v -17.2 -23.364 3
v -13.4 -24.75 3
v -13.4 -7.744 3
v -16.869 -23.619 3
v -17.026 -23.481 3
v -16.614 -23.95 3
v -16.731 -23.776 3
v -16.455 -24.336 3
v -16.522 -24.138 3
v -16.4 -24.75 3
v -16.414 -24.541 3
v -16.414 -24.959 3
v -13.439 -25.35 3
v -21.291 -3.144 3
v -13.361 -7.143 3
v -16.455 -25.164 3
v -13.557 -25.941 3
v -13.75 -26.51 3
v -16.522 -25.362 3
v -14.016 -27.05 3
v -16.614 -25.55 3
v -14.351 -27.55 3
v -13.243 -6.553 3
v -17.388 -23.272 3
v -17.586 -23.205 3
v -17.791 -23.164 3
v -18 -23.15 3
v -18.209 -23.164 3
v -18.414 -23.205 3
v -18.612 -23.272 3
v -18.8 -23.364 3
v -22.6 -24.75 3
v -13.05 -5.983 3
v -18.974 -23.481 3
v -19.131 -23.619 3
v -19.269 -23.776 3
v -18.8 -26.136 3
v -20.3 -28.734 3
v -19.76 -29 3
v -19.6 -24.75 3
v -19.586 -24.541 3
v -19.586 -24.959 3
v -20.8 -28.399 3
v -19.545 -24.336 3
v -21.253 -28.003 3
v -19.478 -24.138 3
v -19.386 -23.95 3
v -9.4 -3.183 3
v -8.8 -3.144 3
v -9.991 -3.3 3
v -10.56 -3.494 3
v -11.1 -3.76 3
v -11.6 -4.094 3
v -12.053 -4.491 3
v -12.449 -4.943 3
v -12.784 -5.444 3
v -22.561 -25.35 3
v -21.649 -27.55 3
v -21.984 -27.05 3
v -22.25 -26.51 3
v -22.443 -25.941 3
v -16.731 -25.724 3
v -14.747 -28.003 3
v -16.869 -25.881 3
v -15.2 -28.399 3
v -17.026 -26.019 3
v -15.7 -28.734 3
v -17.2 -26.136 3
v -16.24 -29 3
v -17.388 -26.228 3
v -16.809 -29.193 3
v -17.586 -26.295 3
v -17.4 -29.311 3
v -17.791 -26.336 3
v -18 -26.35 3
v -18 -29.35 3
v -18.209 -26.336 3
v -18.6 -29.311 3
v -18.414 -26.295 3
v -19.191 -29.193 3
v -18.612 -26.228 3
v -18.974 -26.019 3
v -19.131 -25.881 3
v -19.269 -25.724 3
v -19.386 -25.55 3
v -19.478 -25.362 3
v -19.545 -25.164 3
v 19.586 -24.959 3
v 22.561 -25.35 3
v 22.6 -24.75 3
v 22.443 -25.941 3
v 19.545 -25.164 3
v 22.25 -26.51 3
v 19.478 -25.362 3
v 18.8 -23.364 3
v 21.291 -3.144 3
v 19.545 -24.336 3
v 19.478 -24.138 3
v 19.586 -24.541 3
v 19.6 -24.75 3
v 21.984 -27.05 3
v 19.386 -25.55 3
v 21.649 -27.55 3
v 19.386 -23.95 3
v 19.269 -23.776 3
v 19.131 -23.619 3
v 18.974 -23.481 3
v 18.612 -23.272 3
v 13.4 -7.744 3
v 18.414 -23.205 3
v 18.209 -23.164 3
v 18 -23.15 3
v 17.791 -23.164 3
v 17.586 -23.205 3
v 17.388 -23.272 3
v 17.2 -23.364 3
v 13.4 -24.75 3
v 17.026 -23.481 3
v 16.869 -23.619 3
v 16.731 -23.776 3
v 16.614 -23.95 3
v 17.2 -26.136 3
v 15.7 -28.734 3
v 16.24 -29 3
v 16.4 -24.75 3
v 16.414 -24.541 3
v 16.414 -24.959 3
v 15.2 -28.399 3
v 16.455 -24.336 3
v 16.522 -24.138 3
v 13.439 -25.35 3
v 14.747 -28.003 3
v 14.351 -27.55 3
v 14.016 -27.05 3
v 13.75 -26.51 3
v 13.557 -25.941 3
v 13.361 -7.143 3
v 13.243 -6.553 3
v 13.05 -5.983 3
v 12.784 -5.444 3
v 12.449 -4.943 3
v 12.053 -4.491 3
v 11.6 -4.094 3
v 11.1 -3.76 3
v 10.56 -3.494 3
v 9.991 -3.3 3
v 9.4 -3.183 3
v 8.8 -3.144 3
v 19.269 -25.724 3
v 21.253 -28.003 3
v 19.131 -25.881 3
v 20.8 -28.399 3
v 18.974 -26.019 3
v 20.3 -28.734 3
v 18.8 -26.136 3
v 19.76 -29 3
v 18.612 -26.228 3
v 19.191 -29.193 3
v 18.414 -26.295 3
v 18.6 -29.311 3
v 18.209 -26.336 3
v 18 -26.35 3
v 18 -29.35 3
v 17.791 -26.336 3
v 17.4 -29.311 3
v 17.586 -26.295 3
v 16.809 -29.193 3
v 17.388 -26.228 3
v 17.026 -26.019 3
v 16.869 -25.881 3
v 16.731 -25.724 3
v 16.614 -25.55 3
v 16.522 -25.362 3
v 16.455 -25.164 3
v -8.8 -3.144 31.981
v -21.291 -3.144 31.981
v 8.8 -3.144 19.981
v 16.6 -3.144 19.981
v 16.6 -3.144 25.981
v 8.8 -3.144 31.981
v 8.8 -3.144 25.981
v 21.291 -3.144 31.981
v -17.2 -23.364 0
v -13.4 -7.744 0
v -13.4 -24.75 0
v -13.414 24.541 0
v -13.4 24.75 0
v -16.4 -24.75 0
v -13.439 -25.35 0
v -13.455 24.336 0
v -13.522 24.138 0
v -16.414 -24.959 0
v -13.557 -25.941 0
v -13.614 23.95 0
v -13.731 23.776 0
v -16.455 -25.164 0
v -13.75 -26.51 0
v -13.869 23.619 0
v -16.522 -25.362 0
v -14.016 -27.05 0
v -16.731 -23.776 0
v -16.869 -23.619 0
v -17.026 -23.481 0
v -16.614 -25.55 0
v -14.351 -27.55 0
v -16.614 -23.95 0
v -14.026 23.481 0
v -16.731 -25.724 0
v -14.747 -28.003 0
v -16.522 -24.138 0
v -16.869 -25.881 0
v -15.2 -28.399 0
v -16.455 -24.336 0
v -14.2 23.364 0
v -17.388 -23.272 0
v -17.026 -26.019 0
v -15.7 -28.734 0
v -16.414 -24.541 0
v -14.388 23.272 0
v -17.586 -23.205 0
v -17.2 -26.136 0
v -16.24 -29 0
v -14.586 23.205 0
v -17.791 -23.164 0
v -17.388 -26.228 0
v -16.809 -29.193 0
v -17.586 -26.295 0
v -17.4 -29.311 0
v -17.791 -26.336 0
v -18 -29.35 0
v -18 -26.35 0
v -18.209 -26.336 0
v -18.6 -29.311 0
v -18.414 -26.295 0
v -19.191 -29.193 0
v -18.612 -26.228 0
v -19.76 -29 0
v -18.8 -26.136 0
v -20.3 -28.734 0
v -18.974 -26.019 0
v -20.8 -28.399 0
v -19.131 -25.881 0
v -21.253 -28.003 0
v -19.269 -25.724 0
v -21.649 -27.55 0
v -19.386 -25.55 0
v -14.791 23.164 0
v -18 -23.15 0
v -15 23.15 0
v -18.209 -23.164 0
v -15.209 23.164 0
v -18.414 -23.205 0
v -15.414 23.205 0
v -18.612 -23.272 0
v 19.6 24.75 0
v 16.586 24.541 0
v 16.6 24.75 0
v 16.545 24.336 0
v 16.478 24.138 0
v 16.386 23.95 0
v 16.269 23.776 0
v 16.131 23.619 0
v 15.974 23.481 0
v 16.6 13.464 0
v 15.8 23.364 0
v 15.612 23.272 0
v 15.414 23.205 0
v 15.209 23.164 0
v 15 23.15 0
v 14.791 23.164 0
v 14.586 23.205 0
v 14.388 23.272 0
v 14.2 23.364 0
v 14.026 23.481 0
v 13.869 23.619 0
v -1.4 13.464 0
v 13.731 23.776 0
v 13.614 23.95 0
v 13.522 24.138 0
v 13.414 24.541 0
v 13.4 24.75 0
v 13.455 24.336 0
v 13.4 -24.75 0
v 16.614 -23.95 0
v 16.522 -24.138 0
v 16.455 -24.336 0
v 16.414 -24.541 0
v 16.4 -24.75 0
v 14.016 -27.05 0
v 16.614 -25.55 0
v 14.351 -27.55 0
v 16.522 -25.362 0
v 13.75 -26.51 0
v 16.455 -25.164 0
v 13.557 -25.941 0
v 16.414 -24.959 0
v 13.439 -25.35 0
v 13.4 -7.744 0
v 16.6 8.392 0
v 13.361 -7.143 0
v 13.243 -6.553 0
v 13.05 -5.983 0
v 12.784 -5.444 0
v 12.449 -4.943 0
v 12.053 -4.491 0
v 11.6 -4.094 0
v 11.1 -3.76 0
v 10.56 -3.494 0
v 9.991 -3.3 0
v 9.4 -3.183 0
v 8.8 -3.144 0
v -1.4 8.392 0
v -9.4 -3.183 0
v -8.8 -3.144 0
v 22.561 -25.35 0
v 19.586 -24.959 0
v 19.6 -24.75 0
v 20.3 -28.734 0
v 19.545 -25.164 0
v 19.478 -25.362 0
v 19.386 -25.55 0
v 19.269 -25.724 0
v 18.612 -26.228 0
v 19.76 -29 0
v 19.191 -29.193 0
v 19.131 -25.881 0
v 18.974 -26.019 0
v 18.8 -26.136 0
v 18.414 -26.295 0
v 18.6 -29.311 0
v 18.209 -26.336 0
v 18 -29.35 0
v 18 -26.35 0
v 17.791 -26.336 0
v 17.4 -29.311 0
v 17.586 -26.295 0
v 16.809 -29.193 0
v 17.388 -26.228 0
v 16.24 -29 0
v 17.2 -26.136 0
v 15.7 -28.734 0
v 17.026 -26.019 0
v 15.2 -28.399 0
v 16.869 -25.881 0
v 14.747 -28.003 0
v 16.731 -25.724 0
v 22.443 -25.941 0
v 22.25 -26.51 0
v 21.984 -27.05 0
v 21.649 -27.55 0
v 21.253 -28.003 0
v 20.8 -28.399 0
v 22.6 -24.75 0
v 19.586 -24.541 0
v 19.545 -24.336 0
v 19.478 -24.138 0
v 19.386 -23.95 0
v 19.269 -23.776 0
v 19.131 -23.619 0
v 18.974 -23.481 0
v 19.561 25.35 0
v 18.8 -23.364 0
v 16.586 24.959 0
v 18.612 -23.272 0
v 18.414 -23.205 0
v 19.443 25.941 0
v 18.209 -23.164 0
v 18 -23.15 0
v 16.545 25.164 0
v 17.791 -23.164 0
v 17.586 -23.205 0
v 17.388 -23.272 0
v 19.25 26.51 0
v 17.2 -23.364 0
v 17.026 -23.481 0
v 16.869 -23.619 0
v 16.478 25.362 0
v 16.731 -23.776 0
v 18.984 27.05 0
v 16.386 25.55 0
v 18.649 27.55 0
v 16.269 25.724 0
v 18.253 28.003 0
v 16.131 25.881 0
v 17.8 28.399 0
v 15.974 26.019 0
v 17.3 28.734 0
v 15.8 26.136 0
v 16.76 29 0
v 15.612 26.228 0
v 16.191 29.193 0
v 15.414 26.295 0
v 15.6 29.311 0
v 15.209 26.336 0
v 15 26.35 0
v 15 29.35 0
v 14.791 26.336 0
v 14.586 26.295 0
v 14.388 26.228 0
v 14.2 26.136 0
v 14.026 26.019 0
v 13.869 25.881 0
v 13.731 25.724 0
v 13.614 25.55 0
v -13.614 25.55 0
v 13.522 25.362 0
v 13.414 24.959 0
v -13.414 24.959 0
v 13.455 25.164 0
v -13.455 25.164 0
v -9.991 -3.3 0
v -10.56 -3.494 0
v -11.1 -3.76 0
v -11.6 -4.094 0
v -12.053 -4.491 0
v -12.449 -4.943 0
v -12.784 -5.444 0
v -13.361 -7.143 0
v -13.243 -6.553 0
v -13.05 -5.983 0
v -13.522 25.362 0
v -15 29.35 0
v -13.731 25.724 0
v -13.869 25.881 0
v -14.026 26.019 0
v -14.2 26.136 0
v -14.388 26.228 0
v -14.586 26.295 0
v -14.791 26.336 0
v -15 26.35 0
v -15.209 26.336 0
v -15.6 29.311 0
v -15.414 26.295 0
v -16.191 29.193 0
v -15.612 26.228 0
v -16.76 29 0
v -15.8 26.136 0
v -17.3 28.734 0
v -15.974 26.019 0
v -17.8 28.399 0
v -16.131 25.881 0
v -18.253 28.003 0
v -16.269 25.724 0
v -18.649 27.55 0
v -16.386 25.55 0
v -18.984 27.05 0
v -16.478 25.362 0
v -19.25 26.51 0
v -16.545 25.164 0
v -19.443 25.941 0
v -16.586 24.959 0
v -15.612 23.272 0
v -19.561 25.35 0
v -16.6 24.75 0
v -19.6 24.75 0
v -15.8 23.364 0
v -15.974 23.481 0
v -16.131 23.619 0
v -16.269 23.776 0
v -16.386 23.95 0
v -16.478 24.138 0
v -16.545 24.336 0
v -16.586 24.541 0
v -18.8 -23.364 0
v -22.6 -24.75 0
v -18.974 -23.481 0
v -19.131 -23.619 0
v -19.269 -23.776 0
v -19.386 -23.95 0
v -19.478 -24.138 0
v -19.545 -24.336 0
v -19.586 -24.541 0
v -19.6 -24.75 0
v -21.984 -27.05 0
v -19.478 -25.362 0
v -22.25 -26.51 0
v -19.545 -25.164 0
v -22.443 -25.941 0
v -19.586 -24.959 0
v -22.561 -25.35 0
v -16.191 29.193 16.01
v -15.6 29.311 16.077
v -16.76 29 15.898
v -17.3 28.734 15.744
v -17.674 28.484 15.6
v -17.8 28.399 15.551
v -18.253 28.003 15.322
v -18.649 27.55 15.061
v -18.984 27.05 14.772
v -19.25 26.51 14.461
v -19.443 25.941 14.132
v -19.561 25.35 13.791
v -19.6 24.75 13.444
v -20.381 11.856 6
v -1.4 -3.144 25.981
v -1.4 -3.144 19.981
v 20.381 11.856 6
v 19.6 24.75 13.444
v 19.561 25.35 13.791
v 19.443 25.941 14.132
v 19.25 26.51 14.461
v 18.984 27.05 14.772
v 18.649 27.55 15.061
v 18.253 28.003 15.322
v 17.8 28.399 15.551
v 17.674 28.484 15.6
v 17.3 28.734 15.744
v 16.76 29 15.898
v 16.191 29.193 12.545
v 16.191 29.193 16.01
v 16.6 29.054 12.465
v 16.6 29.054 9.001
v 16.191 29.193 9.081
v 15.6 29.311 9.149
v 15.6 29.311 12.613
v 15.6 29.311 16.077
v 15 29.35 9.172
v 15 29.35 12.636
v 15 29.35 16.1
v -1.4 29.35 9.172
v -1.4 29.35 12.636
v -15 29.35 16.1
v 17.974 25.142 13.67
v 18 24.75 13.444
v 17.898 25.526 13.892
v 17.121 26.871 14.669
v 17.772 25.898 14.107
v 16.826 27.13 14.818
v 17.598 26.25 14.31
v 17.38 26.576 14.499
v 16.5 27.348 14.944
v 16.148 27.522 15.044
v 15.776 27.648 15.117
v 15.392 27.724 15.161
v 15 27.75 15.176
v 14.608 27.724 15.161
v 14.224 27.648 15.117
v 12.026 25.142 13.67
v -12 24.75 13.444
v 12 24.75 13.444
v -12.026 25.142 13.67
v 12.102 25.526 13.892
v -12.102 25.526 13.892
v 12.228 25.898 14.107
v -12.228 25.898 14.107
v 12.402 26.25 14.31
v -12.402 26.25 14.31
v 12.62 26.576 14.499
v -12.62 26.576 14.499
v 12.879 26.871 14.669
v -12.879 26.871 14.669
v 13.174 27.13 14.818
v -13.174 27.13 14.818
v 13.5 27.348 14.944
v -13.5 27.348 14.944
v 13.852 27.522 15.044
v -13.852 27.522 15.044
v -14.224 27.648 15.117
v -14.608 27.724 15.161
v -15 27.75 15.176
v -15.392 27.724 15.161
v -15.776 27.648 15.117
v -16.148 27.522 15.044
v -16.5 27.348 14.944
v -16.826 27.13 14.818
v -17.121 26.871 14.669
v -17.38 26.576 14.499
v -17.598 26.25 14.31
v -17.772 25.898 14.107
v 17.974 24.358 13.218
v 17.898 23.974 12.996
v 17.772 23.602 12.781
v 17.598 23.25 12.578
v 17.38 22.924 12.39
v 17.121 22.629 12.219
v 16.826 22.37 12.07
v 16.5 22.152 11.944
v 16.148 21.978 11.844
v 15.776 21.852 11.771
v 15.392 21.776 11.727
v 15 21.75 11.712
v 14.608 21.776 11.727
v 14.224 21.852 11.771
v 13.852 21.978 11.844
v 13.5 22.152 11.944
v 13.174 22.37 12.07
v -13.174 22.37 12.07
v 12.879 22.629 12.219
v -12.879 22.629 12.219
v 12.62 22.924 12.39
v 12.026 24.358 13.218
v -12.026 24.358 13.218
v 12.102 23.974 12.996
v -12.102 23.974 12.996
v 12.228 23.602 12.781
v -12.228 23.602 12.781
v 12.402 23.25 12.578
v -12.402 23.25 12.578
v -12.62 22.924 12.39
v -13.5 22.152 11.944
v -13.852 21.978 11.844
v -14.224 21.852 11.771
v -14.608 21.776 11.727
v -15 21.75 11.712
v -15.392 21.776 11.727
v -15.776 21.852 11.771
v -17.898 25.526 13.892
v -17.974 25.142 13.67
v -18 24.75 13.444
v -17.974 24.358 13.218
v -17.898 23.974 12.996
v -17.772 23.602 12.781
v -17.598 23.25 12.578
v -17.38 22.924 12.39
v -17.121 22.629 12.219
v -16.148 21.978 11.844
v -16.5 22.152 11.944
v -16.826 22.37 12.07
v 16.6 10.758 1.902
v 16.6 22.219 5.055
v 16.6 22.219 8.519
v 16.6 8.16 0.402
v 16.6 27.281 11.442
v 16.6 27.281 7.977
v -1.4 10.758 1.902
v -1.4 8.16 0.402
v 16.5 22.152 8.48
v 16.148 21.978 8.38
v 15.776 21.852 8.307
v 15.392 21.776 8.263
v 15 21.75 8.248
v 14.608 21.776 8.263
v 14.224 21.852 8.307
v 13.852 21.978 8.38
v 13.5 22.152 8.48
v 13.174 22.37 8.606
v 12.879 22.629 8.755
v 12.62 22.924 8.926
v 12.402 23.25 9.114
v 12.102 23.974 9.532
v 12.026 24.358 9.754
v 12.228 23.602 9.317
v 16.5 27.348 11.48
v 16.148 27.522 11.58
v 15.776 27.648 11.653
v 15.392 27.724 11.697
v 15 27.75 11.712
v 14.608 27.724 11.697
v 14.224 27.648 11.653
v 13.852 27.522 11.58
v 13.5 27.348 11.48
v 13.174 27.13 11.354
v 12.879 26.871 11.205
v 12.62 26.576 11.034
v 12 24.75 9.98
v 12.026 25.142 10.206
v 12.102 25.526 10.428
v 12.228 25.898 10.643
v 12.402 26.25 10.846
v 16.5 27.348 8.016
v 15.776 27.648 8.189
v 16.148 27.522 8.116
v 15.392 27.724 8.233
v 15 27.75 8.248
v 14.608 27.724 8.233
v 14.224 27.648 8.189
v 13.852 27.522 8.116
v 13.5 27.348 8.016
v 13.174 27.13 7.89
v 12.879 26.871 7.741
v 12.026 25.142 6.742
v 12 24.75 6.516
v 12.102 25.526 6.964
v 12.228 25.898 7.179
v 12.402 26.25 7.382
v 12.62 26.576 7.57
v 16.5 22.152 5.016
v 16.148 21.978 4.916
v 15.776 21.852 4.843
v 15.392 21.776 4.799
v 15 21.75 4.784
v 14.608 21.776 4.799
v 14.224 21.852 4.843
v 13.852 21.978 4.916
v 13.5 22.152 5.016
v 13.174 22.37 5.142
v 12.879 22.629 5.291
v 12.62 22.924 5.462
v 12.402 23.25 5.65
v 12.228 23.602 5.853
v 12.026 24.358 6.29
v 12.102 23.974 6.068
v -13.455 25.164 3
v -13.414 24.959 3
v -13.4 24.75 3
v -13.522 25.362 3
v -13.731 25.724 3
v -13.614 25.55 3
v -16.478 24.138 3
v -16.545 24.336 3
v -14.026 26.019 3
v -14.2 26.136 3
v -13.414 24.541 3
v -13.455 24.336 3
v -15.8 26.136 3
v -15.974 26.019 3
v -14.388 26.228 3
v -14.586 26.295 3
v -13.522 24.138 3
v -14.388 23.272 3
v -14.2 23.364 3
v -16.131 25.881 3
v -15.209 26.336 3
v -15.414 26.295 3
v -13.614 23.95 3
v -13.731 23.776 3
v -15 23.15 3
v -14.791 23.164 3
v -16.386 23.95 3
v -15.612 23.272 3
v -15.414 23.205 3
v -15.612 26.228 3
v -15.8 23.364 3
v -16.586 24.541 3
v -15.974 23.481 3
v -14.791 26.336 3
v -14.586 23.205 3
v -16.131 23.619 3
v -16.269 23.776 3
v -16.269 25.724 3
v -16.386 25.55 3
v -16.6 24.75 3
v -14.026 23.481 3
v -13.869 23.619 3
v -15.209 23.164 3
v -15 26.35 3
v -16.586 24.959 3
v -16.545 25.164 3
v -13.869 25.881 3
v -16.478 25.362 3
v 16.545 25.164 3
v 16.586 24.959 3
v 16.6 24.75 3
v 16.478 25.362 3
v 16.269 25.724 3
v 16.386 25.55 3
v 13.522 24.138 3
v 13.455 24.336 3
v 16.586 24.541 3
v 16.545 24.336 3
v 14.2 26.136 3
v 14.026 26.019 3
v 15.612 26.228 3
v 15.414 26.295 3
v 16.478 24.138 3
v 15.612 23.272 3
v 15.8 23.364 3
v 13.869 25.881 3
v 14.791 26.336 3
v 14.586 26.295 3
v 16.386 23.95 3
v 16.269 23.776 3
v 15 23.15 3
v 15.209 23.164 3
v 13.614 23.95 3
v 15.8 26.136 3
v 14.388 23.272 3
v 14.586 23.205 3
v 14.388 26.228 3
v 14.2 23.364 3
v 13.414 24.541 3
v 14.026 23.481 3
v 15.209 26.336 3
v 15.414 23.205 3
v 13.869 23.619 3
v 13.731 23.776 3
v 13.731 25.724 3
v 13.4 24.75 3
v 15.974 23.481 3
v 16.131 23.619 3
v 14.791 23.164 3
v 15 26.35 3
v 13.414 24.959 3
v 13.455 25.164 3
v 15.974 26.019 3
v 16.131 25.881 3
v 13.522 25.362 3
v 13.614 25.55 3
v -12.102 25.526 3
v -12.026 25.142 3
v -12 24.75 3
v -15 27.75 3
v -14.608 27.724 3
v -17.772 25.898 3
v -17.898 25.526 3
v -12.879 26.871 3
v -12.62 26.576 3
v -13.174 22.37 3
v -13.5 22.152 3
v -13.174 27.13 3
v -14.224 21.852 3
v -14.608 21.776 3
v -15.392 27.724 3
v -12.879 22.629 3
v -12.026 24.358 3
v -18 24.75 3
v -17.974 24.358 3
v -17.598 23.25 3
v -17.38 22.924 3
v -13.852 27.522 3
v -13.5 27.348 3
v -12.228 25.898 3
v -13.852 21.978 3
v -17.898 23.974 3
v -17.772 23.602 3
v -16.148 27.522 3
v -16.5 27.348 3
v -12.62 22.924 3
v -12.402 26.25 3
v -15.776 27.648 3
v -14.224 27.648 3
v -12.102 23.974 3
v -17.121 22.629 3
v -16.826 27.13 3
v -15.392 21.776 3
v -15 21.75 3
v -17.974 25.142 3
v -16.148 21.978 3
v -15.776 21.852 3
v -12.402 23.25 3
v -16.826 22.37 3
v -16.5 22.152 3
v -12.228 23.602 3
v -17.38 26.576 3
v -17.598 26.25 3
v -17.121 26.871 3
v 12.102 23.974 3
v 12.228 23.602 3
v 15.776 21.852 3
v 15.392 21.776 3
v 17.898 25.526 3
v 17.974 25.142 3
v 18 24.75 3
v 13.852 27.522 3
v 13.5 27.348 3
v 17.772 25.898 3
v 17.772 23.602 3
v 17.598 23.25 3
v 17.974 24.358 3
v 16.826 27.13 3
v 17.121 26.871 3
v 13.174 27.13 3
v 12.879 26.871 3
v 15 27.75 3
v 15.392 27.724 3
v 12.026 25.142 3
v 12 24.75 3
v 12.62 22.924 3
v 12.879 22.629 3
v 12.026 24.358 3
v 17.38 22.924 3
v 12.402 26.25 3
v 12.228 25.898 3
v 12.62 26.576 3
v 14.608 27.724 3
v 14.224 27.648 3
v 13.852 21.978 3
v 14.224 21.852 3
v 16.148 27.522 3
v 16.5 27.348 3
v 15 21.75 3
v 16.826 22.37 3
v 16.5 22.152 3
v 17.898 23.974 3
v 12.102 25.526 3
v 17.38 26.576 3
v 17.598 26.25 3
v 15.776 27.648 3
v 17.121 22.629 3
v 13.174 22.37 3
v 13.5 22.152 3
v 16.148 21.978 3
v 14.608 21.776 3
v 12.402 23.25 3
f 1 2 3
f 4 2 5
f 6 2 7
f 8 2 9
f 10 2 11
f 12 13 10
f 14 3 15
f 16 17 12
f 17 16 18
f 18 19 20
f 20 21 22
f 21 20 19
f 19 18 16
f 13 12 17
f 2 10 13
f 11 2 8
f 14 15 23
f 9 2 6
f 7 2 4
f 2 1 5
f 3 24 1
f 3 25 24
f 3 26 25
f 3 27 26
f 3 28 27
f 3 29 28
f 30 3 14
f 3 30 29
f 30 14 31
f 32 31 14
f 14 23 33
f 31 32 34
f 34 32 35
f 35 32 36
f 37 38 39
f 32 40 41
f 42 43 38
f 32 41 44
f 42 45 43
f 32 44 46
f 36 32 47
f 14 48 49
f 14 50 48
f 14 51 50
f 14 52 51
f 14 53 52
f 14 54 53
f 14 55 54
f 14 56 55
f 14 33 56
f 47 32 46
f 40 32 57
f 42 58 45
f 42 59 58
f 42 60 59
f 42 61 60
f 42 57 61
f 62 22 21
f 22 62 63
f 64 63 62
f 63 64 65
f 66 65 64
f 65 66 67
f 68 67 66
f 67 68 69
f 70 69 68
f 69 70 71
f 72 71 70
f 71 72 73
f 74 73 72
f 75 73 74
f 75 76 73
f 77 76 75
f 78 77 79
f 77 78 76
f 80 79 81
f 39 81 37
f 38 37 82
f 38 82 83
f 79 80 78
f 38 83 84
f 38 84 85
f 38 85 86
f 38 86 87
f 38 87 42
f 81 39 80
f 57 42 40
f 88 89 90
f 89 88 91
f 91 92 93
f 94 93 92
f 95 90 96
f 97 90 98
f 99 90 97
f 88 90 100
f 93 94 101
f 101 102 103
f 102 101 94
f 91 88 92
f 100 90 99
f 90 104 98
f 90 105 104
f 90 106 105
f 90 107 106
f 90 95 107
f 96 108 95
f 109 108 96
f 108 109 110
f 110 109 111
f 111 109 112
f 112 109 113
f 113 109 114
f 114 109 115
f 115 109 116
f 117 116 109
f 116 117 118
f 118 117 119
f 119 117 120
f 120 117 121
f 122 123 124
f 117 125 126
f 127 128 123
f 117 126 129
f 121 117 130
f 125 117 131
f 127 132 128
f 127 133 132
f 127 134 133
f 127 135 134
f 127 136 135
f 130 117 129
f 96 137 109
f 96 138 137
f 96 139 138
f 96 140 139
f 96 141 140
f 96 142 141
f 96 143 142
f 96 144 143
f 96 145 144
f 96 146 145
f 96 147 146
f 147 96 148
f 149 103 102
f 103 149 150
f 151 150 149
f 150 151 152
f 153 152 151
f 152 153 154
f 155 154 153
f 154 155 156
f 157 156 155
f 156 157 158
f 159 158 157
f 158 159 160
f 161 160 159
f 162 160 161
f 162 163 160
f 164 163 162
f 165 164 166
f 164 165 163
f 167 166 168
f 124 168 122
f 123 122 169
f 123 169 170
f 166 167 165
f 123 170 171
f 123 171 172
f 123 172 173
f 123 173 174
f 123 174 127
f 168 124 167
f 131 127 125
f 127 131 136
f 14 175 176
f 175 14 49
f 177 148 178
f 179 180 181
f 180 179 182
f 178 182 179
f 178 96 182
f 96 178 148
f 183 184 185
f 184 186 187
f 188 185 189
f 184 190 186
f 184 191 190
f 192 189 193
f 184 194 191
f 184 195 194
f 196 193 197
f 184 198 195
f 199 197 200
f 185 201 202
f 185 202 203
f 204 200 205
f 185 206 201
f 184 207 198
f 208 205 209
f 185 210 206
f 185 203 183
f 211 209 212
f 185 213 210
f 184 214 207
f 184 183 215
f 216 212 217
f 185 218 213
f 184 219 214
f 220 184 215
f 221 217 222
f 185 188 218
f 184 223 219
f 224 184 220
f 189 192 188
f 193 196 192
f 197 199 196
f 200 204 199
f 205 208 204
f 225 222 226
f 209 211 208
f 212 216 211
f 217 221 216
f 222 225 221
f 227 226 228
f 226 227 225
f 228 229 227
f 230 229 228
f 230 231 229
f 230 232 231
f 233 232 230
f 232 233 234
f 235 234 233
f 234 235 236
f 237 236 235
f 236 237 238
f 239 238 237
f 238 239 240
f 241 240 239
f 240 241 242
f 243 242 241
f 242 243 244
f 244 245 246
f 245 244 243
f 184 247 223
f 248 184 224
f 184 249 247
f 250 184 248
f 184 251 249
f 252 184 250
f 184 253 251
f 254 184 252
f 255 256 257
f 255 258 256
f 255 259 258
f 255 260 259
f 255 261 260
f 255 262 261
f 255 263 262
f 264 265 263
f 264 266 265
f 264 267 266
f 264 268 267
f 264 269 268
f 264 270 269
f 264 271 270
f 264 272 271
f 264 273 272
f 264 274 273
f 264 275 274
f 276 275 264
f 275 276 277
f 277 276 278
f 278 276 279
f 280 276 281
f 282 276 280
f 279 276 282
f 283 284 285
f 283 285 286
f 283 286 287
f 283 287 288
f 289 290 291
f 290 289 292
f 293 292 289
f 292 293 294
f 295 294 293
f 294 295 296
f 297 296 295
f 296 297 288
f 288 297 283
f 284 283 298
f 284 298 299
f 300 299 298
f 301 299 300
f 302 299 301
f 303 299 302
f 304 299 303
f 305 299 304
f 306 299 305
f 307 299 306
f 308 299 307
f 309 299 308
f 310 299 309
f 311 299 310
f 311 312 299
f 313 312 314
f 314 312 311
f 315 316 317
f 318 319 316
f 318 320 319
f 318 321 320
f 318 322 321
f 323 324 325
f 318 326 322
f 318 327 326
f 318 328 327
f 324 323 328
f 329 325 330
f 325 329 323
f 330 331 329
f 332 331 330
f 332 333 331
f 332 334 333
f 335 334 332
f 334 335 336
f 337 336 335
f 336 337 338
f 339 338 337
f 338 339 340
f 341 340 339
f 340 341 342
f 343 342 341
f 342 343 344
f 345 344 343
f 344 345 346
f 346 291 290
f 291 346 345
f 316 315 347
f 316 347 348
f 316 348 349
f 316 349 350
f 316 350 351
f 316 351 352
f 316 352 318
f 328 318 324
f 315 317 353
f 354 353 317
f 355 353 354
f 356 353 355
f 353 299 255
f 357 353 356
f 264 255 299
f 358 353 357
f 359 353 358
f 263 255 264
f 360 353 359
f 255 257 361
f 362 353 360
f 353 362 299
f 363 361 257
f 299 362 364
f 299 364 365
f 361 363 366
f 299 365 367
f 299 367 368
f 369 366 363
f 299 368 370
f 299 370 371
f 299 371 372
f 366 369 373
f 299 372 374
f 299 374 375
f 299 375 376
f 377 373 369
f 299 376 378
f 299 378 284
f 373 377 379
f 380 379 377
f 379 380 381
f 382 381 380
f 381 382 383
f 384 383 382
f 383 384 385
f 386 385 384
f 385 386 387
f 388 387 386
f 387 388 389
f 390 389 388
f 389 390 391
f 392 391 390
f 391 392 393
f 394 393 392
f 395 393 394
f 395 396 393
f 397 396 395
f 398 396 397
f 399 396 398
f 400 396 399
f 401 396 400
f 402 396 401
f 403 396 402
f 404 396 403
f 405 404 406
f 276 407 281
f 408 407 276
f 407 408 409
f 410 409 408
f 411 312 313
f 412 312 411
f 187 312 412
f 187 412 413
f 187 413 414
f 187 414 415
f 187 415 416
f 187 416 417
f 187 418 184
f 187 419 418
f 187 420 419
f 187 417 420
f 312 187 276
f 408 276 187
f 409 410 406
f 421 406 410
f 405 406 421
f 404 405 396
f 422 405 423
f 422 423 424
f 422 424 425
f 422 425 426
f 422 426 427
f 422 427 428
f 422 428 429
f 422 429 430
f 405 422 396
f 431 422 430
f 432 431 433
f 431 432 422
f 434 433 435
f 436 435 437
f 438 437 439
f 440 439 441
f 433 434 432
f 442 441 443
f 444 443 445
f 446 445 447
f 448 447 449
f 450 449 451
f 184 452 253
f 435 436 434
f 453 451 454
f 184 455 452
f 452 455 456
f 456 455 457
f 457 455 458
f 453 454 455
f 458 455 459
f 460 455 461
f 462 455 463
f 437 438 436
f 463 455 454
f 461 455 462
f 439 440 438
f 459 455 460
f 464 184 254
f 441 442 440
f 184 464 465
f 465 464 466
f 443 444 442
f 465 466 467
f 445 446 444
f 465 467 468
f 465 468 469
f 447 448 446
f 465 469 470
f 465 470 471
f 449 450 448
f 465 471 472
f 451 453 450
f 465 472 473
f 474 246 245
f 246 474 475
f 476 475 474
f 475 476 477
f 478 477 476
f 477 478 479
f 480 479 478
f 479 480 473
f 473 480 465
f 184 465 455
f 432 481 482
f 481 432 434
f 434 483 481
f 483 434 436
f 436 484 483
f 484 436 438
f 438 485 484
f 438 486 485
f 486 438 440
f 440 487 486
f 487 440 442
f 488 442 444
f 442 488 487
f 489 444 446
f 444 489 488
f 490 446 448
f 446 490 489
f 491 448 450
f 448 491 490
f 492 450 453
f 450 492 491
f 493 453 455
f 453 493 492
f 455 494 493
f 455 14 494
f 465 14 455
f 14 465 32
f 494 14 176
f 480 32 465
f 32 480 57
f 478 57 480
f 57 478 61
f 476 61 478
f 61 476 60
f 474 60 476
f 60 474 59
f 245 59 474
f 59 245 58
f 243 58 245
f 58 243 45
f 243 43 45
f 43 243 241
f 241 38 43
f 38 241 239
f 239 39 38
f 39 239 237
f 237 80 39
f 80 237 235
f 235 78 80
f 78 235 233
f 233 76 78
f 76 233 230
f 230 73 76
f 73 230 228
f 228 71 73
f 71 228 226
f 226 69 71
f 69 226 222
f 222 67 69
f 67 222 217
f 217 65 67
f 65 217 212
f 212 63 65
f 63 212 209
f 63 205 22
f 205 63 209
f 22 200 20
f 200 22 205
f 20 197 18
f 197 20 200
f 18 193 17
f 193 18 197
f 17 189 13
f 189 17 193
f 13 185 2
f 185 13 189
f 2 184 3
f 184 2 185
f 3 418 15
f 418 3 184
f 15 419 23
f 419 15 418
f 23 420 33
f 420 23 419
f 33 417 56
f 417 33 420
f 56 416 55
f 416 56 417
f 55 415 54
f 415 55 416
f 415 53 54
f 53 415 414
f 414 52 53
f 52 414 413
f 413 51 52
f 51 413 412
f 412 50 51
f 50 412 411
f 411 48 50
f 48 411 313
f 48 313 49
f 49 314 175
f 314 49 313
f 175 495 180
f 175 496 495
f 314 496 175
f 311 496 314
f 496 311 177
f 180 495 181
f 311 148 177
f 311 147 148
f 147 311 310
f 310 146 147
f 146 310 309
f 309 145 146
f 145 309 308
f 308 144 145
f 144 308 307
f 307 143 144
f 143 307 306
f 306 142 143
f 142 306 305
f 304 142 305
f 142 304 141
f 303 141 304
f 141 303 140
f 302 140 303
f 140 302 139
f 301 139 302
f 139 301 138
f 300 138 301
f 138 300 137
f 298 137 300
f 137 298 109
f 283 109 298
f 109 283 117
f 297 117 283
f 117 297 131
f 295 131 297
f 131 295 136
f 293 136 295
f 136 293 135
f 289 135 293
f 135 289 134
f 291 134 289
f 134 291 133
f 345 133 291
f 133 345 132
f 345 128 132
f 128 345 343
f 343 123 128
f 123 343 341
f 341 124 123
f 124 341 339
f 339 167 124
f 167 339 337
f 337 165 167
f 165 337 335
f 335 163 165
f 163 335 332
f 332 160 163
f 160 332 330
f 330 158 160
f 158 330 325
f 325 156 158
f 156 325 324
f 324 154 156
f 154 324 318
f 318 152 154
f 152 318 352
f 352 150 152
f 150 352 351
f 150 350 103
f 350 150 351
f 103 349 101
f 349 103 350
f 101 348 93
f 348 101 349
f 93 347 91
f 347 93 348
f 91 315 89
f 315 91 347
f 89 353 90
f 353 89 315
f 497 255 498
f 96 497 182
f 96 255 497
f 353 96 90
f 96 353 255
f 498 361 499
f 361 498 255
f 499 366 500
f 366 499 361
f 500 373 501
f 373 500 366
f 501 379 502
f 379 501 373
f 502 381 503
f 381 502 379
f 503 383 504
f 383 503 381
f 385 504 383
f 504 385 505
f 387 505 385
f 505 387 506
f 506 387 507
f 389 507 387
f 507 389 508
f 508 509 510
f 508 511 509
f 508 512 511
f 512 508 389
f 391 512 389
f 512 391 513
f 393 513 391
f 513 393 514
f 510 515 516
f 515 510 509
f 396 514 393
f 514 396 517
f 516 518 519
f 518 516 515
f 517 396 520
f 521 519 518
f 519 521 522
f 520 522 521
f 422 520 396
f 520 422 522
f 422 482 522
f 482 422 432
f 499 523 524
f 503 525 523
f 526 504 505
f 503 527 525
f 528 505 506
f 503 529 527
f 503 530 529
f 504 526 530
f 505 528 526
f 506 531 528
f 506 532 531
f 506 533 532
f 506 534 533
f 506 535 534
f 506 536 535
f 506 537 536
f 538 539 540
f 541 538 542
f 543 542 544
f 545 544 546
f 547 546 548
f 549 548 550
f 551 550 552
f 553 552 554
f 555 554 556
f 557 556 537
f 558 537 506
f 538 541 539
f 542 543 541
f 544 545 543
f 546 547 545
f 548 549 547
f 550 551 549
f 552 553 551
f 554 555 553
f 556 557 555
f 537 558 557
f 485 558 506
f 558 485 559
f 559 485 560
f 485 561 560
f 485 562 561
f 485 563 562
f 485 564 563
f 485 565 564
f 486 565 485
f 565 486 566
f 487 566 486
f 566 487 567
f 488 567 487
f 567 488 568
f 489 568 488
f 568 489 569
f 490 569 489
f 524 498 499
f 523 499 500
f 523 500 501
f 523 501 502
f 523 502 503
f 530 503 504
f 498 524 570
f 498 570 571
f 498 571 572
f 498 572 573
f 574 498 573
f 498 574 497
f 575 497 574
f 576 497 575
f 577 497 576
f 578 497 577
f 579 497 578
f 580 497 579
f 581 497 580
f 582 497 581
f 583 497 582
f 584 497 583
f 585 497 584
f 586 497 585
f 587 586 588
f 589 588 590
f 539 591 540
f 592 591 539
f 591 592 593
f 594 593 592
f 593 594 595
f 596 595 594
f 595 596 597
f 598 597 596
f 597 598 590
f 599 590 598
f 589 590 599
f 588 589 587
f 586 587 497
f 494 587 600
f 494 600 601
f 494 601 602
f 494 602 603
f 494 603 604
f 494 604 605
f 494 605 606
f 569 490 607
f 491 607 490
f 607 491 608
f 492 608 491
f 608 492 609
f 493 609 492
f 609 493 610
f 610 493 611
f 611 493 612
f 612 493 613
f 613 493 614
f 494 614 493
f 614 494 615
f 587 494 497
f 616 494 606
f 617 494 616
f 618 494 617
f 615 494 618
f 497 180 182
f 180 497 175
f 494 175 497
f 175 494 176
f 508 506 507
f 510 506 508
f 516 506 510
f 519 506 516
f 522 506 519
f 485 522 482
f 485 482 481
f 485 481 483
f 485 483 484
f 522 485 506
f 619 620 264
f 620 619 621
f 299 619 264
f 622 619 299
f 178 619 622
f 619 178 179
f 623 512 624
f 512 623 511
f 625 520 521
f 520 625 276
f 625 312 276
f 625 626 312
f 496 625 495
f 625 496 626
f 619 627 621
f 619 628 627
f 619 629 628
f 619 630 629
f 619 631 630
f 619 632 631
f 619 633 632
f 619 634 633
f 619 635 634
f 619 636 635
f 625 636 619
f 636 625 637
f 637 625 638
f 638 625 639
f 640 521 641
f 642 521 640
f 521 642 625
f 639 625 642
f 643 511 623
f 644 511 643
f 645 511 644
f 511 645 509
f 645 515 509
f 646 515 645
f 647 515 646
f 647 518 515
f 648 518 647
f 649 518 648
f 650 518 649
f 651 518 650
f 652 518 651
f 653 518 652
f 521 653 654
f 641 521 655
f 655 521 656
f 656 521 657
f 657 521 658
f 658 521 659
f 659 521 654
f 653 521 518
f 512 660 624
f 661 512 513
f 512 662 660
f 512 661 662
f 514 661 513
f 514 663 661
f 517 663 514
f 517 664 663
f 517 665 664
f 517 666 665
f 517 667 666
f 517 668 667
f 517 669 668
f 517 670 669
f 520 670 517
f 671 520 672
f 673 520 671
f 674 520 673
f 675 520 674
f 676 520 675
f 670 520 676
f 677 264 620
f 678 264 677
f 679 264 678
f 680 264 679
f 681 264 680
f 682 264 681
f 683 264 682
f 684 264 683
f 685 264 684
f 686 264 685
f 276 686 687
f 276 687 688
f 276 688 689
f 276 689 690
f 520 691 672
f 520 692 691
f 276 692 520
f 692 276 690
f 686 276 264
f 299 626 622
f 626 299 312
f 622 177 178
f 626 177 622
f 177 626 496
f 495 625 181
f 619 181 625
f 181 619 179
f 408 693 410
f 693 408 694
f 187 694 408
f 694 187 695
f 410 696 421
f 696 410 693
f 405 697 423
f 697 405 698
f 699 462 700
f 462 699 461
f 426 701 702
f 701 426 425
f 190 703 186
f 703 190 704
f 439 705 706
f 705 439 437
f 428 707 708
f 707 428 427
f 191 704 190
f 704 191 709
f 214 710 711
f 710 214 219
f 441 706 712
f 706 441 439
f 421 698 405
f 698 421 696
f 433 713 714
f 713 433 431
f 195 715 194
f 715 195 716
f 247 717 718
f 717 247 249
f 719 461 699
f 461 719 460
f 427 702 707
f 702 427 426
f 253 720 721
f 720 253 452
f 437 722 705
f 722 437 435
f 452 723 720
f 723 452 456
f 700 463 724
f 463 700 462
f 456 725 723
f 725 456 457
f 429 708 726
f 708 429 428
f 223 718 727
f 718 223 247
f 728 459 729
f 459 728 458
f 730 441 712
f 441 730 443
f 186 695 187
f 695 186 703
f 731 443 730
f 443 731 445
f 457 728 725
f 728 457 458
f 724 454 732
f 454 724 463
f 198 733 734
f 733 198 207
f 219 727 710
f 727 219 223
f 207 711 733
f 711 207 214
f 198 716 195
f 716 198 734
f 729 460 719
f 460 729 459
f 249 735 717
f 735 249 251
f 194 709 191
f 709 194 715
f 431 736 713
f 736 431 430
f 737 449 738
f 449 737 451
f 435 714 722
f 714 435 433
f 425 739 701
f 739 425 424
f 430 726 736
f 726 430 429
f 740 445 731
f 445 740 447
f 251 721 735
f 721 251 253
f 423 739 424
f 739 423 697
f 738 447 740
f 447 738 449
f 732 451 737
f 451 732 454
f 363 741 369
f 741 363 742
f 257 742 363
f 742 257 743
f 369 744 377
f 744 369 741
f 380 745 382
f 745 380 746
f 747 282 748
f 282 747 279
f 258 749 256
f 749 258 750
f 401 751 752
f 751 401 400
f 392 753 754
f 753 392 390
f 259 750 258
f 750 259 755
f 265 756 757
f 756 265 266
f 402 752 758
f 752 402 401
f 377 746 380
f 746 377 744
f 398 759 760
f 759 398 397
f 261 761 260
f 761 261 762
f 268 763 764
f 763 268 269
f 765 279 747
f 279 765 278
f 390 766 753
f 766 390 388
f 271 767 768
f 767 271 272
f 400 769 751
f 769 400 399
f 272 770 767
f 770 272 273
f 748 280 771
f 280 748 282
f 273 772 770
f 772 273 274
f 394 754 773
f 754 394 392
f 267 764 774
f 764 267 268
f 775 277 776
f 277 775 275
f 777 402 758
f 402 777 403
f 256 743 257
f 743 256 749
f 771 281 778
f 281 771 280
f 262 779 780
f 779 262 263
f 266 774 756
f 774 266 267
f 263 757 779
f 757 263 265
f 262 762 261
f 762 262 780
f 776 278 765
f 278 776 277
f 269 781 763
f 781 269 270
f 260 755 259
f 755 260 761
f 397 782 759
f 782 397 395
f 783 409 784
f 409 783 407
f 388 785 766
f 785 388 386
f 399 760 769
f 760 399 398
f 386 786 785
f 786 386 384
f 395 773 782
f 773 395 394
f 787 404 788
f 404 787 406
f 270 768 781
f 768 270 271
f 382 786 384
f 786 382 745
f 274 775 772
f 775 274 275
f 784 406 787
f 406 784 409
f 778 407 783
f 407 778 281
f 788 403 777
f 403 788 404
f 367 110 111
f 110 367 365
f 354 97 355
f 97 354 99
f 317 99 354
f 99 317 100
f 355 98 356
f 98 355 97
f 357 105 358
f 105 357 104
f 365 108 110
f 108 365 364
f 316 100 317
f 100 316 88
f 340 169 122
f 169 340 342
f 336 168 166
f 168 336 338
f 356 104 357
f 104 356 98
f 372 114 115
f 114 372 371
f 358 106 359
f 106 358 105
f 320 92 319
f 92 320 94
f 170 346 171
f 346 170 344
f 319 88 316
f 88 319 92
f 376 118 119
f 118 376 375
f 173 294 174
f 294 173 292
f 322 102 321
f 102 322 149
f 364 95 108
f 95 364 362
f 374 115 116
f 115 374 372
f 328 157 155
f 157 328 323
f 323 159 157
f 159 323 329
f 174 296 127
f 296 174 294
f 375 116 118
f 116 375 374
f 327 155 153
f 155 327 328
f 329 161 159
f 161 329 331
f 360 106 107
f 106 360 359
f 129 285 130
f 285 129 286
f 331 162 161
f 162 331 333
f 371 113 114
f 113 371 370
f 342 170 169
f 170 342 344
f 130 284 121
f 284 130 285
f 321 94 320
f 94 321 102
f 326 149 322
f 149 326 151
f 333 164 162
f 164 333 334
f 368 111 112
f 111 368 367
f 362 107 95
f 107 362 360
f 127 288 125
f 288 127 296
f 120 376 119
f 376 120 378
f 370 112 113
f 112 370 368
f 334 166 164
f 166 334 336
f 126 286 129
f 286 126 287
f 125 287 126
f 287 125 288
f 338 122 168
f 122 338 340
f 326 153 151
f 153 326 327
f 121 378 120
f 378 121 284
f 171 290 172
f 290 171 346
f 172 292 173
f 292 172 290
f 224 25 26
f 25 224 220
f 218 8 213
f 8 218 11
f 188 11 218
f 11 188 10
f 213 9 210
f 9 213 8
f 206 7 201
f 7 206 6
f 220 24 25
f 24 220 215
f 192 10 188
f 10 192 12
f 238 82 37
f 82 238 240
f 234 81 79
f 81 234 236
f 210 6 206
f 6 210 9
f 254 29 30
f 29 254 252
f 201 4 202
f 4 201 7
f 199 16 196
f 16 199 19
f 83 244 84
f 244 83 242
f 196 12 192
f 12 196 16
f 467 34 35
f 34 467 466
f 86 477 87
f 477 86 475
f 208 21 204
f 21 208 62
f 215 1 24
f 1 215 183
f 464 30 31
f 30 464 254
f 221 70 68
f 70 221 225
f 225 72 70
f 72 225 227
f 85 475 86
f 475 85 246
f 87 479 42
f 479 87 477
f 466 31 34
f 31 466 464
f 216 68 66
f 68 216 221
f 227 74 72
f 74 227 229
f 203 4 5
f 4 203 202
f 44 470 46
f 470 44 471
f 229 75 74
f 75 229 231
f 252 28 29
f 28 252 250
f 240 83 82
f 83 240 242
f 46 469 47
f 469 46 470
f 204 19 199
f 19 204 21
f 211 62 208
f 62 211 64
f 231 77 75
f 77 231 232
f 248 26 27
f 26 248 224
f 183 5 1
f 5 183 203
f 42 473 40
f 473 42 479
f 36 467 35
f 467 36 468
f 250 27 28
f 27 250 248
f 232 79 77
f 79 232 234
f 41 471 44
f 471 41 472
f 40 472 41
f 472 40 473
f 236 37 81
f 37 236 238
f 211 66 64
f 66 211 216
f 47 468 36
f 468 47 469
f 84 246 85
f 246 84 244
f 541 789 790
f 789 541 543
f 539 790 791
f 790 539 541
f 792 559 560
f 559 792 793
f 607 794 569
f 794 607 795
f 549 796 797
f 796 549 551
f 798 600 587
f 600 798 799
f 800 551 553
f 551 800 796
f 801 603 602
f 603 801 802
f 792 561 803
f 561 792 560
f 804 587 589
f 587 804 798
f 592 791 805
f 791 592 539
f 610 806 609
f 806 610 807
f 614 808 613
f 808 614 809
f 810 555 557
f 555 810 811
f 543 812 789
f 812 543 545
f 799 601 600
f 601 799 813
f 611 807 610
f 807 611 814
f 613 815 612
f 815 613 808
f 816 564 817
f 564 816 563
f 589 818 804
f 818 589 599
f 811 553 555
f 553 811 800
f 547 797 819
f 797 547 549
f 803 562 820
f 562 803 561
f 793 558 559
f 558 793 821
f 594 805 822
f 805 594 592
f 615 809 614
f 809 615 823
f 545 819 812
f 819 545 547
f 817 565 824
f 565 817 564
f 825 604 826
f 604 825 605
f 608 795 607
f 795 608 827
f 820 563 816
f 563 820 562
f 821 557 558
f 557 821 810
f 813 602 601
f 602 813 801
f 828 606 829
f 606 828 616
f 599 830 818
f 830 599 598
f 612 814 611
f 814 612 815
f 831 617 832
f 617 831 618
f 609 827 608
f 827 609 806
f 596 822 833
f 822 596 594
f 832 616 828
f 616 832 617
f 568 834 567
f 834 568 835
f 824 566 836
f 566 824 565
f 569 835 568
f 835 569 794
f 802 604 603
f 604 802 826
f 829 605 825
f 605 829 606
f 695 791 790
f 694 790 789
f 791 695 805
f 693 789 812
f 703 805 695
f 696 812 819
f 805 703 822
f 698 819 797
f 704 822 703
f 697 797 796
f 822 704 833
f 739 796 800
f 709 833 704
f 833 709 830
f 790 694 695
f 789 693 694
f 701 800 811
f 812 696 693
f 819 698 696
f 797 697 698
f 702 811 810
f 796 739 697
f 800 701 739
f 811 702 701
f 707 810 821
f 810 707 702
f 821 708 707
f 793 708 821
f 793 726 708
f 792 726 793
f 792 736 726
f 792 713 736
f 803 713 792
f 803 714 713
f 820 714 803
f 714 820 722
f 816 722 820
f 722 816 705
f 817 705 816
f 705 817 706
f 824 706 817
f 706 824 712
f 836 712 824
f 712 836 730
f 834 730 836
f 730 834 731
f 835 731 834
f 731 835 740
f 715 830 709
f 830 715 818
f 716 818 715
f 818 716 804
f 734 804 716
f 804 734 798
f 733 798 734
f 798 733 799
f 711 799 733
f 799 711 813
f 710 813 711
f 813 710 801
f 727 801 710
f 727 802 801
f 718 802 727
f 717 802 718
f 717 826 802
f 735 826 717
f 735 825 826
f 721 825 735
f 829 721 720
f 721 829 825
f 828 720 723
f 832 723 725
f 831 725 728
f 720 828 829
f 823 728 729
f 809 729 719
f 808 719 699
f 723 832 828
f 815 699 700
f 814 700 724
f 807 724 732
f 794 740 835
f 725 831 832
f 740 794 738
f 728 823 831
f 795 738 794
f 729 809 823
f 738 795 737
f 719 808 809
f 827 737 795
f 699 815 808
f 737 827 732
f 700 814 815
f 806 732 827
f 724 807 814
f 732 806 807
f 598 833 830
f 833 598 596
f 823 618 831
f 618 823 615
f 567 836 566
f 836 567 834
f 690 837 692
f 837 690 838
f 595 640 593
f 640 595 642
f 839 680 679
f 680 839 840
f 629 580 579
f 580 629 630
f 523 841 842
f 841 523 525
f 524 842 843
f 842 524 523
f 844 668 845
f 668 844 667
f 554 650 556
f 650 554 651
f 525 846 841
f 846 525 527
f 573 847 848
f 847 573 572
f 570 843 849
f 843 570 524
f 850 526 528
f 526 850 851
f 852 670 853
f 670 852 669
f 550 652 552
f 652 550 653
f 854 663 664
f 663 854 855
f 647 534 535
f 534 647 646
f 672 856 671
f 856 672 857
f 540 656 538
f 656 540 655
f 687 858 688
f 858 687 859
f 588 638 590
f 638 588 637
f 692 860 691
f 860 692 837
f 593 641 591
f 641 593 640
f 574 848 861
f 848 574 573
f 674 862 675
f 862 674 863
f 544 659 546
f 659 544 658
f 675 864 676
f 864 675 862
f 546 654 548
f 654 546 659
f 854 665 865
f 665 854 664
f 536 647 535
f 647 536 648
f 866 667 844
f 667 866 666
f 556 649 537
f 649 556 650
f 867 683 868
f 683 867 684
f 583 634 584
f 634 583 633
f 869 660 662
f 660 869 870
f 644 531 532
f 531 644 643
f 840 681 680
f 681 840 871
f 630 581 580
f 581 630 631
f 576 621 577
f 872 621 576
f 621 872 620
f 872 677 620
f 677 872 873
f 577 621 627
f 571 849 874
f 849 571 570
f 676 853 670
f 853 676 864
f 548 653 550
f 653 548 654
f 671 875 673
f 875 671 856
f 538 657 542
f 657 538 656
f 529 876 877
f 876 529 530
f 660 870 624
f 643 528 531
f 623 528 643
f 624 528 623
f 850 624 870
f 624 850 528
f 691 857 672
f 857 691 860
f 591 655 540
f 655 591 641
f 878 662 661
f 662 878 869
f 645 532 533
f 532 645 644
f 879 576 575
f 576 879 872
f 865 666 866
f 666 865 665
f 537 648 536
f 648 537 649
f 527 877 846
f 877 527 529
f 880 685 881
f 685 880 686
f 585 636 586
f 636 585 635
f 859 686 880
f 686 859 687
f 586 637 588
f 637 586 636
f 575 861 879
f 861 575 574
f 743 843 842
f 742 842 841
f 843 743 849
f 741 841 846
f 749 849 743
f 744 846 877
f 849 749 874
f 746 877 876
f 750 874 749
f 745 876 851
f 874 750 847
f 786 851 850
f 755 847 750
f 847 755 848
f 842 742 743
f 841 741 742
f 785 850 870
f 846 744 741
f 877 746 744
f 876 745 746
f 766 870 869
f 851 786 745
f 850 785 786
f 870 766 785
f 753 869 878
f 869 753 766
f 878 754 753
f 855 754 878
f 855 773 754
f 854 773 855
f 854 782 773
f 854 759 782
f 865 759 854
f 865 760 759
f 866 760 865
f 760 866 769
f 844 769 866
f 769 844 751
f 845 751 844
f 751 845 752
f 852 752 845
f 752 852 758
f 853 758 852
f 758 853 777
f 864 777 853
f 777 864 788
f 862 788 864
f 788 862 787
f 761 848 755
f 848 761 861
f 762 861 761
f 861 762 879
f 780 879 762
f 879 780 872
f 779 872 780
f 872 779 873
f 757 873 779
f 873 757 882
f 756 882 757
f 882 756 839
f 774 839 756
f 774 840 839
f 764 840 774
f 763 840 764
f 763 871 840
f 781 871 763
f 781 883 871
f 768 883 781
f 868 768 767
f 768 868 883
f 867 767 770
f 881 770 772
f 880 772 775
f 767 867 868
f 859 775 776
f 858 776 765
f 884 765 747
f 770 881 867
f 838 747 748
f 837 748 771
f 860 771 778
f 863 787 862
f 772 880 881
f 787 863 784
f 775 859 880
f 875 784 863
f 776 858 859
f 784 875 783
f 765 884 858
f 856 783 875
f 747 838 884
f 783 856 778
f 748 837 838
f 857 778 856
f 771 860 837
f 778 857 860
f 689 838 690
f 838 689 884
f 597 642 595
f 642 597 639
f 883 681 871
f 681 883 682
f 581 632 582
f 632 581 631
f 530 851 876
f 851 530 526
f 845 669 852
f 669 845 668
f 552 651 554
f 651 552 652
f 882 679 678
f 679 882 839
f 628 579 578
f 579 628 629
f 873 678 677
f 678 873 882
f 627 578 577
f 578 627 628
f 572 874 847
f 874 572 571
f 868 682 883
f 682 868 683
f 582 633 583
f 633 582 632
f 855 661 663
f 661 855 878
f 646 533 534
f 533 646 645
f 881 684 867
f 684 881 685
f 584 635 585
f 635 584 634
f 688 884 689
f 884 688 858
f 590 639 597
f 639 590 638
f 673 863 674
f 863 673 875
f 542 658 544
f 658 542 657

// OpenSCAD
//Depth of camera
camera_depth = 20.2;
//Height of the supporting back
back_height = 30;
//C/C Distance between front holes
front_cc = 30;
//C/C Distance between rear holes
rear_cc = 36;
//C/C Distance between front and rear holes
front_rear_cc = 49.5;
//angle of camera
angle = 30; //[10:45]
//Thickness of the base
base_thickness = 3;
//Hole diameter (may need adjustment depending on printer)
hole_size = 3.2;
//Determines the amount of "meat" around the holes
edge_margin = 3;
//Diameter of screw head (to allow enough clerance)
screw_head_size = 6;
//Wedge offset from front
front_offset = 0;
//Add lip to fron of wedge
use_lip = "No"; //[Yes,No]
//Velcro strap width
velcro_width = 18;
//Velcro strap thickness
velcro_thickness = 3;
//Added height under the camera e.g. for prop clearence
added_height = 0;


//Calculated variables wont be visible to Thingiverse customizer
hole_clearence = edge_margin+hole_size/2;
screw_head_clerance = screw_head_size / 2;
hole_radius = hole_size / 2;
lip_thickness = use_lip == "Yes" ? 2*1 : 0*1;
lip_height =  use_lip == "Yes" ? 2*1 : 0*1;

//internal global varaibles
_xFrontOffset = front_cc/2;
_xRearOffset = rear_cc/2;
_xTotFrontOffset = front_cc/2+hole_clearence;
_xTotRearOffset = rear_cc/2+hole_clearence;
_yOffset = front_rear_cc/2;
_yTotOffset = front_rear_cc/2+hole_clearence;
_cameraHolderDepth = (lip_thickness+camera_depth)*cos(angle)+back_height*sin(angle)+lip_thickness;
_cameraHolderHeight = back_height*cos(angle) + base_thickness + velcro_thickness + added_height;
_wedgeStartYoffset = _yTotOffset - front_offset;
_wedgeEndYoffset = _yTotOffset - front_offset - _cameraHolderDepth;
_rearSpaceLeft = _yTotOffset * 2 - front_offset - _cameraHolderDepth;
_totWidth = front_cc > rear_cc ? front_cc + hole_clearence*2 : rear_cc + hole_clearence*2;
_velcroXpos = (velcro_width + edge_margin) < (front_cc+2*edge_margin+hole_size) / 2 ? 0 :  ((front_cc+2*edge_margin+hole_size) / 2 )-(velcro_width + edge_margin);

module createBase()
{   
           
    difference()
    {
        linear_extrude( height = _cameraHolderHeight)
        {
            union()
            {
                if( front_offset > 0 )
                {
                    polygon(
                                points = [  [-_xTotFrontOffset, _yOffset],
                                            [-_xFrontOffset+hole_clearence, _yOffset],
                                            [-_xFrontOffset+hole_clearence, _wedgeStartYoffset],
                                            [_xFrontOffset-hole_clearence, _wedgeStartYoffset],
                                            [_xFrontOffset-hole_clearence, _yOffset],
                                            [_xTotFrontOffset, _yOffset], 
                                            [_xTotRearOffset, -_yOffset], 
                                            [_xRearOffset-hole_clearence, -_yOffset], 
                                            [_xRearOffset-hole_clearence, _wedgeEndYoffset], 
                                            [-_xRearOffset+hole_clearence, _wedgeEndYoffset], 
                                            [-_xRearOffset+hole_clearence, -_yOffset], 
                                            [-_xTotRearOffset, -_yOffset] ], 
                                convexity = 10);
                } else {
                    polygon(
                                points = [  [-_xFrontOffset, _yOffset+hole_clearence],                                        [_xFrontOffset, _yOffset+hole_clearence], 
                                            [_xTotFrontOffset, _yOffset], 
                                            [_xTotRearOffset, -_yOffset], 
                                            [_xRearOffset-hole_clearence, -_yOffset], 
                                            [_xRearOffset-hole_clearence, _wedgeEndYoffset], 
                                            [-_xRearOffset+hole_clearence, _wedgeEndYoffset], 
                                            [-_xRearOffset+hole_clearence, -_yOffset], 
                                            [-_xTotRearOffset, -_yOffset],
                                            [-_xTotFrontOffset, _yOffset]],
                                convexity = 10);
                }
                translate([-_xFrontOffset, _yOffset, 0])
                circle(r=hole_clearence, center = false); 
                translate([_xFrontOffset, _yOffset, 0])
                circle(r=hole_clearence, center = false); 
                translate([_xRearOffset, -_yOffset, 0])
                circle(r=hole_clearence, center = false); 
                translate([-_xRearOffset, -_yOffset, 0])
                circle(r=hole_clearence, center = false); 
                if(front_offset > hole_clearence*2)
                {
                    difference()
                    {
                        union()
                        {
                            translate([_xFrontOffset-hole_clearence*2, _wedgeStartYoffset, 0])
                            square([hole_clearence,hole_clearence]);
                            translate([-_xFrontOffset+hole_clearence, _wedgeStartYoffset, 0])
                            square([hole_clearence,hole_clearence]);
                        }
                        union()
                        {
                            translate([_xFrontOffset-hole_clearence*2, _wedgeStartYoffset+hole_clearence, 0])
                            circle(r=hole_clearence, center = false); 
                            translate([-_xFrontOffset+hole_clearence*2, _wedgeStartYoffset+hole_clearence, 0])                circle(r=hole_clearence, center = false);   
                        }
                    }
                }
                if((_yTotOffset + _wedgeEndYoffset) > hole_clearence*2)
                {
                    difference()
                    {
                        union()
                        {
                            translate([_xRearOffset-hole_clearence*2, _wedgeEndYoffset-hole_clearence, 0])
                            square([hole_clearence,hole_clearence]);
                            translate([-_xRearOffset+hole_clearence, _wedgeEndYoffset-hole_clearence, 0])
                            square([hole_clearence,hole_clearence]);
                            
                        }
                        union()
                        {
                            translate([_xRearOffset-hole_clearence*2, _wedgeEndYoffset-hole_clearence, 0])
                            circle(r=hole_clearence, center = false); 
                            translate([-_xRearOffset+hole_clearence*2, _wedgeEndYoffset-hole_clearence, 0])
                            circle(r=hole_clearence, center = false); 
                        }
                    }
                }
            }
        }
        union()
        {
            translate([-_totWidth/2, _wedgeStartYoffset, base_thickness])
            cube([_totWidth,front_rear_cc,_cameraHolderHeight], center = false);
            rearSpace = _yTotOffset + _wedgeEndYoffset;
            translate([-_totWidth/2, _wedgeEndYoffset-rearSpace, base_thickness])
            cube([_totWidth,rearSpace,_cameraHolderHeight], center = false);
        }
    }    
}

module addWedge()
{
    totWidth = front_cc > rear_cc ? front_cc + edge_margin*2+hole_size: rear_cc + edge_margin*2+hole_size;
                xOffset = totWidth/2;  
    difference()
    {
        difference()
        {
            children();
            union()
            {
                          
                yOffset = (front_rear_cc/2+edge_margin+hole_size/2)-(lip_thickness+camera_depth)*cos(angle) -front_offset;
                translate([-xOffset, yOffset, base_thickness+velcro_thickness+added_height])
                rotate([angle,0,0])
                cube([totWidth, camera_depth, back_height+5], center = false);
                
            }
        }
       
        union()
       {
           yOffset = (front_rear_cc/2+edge_margin+hole_size/2)-lip_thickness*cos(angle) -front_offset; 
                zOffset = base_thickness+velcro_thickness + camera_depth*sin(angle) + added_height;
                translate([-xOffset, yOffset, zOffset])
                rotate([angle,0,0])
                translate([0, -1, lip_height])
                cube([totWidth, front_rear_cc, back_height+5], center = false);
                translate([-xOffset, yOffset, zOffset])
                rotate([angle,0,0])
                translate([0, lip_thickness, 0])
                cube([totWidth, front_rear_cc, back_height+5], center = false);
       }
    }
}

module addStrapHole()
{
    difference()
    {
        children();
        union()
        {
            yOffset = (front_rear_cc/2+edge_margin+hole_size/2)-lip_thickness*cos(angle) -front_offset; 
            zOffset = base_thickness+velcro_thickness + camera_depth*sin(angle);
            translate([0, yOffset, zOffset+added_height])
            rotate([angle,0,0])
            translate([_velcroXpos, 0, -zOffset+base_thickness])
            cube([velcro_width, lip_thickness+1, zOffset*2], center = false);
            ySize = camera_depth + base_thickness + velcro_thickness;
            translate([0, yOffset, zOffset])
            rotate([angle,0,0])            
            translate([_velcroXpos, -ySize, -base_thickness-velcro_thickness])
            cube([velcro_width, ySize+1, velcro_thickness], center = false);
            translate([0, yOffset, zOffset])
            rotate([angle,0,0])            
            translate([_velcroXpos, -ySize, -base_thickness-velcro_thickness])            
            cube([velcro_width, velcro_thickness, back_height*1.5], center = false);
            
        }
    }
}

module clearForScrews()
{
    xOffsetFront = front_cc/2;
    xOffsetRear = rear_cc/2;
    yOffset = front_rear_cc/2;
    
    difference()
    {
        children();
        union()
        {
            //Screw holes
            translate([-xOffsetFront, yOffset, (base_thickness+1)/2])
            cylinder(h=base_thickness+1, r=hole_radius, center = true); 
            translate([xOffsetFront, yOffset, (base_thickness+1)/2])
            cylinder(h=base_thickness+1, r=hole_radius, center = true); 
            translate([xOffsetRear, -yOffset, (base_thickness+1)/2])
            cylinder(h=base_thickness+1, r=hole_radius, center = true); 
            translate([-xOffsetRear, -yOffset, (base_thickness+1)/2])
            cylinder(h=base_thickness+1, r=hole_radius, center = true); 
            translate([xOffsetRear, -yOffset, 50+base_thickness])
            cylinder(h=100, r=screw_head_clerance, center = true);        translate([-xOffsetRear, -yOffset, 50+base_thickness])
            cylinder(h=100, r=screw_head_clerance, center = true);
            translate([-xOffsetFront, yOffset, 50+base_thickness])
            cylinder(h=100, r=screw_head_clerance, center = true);
            translate([xOffsetFront, yOffset, 50+base_thickness])
            cylinder(h=100, r=screw_head_clerance, center = true);             
        }
    }
}


$fn = 48;
clearForScrews()
{
    addStrapHole()
    {
        addWedge()
        {
            createBase();
        }
    }
}
